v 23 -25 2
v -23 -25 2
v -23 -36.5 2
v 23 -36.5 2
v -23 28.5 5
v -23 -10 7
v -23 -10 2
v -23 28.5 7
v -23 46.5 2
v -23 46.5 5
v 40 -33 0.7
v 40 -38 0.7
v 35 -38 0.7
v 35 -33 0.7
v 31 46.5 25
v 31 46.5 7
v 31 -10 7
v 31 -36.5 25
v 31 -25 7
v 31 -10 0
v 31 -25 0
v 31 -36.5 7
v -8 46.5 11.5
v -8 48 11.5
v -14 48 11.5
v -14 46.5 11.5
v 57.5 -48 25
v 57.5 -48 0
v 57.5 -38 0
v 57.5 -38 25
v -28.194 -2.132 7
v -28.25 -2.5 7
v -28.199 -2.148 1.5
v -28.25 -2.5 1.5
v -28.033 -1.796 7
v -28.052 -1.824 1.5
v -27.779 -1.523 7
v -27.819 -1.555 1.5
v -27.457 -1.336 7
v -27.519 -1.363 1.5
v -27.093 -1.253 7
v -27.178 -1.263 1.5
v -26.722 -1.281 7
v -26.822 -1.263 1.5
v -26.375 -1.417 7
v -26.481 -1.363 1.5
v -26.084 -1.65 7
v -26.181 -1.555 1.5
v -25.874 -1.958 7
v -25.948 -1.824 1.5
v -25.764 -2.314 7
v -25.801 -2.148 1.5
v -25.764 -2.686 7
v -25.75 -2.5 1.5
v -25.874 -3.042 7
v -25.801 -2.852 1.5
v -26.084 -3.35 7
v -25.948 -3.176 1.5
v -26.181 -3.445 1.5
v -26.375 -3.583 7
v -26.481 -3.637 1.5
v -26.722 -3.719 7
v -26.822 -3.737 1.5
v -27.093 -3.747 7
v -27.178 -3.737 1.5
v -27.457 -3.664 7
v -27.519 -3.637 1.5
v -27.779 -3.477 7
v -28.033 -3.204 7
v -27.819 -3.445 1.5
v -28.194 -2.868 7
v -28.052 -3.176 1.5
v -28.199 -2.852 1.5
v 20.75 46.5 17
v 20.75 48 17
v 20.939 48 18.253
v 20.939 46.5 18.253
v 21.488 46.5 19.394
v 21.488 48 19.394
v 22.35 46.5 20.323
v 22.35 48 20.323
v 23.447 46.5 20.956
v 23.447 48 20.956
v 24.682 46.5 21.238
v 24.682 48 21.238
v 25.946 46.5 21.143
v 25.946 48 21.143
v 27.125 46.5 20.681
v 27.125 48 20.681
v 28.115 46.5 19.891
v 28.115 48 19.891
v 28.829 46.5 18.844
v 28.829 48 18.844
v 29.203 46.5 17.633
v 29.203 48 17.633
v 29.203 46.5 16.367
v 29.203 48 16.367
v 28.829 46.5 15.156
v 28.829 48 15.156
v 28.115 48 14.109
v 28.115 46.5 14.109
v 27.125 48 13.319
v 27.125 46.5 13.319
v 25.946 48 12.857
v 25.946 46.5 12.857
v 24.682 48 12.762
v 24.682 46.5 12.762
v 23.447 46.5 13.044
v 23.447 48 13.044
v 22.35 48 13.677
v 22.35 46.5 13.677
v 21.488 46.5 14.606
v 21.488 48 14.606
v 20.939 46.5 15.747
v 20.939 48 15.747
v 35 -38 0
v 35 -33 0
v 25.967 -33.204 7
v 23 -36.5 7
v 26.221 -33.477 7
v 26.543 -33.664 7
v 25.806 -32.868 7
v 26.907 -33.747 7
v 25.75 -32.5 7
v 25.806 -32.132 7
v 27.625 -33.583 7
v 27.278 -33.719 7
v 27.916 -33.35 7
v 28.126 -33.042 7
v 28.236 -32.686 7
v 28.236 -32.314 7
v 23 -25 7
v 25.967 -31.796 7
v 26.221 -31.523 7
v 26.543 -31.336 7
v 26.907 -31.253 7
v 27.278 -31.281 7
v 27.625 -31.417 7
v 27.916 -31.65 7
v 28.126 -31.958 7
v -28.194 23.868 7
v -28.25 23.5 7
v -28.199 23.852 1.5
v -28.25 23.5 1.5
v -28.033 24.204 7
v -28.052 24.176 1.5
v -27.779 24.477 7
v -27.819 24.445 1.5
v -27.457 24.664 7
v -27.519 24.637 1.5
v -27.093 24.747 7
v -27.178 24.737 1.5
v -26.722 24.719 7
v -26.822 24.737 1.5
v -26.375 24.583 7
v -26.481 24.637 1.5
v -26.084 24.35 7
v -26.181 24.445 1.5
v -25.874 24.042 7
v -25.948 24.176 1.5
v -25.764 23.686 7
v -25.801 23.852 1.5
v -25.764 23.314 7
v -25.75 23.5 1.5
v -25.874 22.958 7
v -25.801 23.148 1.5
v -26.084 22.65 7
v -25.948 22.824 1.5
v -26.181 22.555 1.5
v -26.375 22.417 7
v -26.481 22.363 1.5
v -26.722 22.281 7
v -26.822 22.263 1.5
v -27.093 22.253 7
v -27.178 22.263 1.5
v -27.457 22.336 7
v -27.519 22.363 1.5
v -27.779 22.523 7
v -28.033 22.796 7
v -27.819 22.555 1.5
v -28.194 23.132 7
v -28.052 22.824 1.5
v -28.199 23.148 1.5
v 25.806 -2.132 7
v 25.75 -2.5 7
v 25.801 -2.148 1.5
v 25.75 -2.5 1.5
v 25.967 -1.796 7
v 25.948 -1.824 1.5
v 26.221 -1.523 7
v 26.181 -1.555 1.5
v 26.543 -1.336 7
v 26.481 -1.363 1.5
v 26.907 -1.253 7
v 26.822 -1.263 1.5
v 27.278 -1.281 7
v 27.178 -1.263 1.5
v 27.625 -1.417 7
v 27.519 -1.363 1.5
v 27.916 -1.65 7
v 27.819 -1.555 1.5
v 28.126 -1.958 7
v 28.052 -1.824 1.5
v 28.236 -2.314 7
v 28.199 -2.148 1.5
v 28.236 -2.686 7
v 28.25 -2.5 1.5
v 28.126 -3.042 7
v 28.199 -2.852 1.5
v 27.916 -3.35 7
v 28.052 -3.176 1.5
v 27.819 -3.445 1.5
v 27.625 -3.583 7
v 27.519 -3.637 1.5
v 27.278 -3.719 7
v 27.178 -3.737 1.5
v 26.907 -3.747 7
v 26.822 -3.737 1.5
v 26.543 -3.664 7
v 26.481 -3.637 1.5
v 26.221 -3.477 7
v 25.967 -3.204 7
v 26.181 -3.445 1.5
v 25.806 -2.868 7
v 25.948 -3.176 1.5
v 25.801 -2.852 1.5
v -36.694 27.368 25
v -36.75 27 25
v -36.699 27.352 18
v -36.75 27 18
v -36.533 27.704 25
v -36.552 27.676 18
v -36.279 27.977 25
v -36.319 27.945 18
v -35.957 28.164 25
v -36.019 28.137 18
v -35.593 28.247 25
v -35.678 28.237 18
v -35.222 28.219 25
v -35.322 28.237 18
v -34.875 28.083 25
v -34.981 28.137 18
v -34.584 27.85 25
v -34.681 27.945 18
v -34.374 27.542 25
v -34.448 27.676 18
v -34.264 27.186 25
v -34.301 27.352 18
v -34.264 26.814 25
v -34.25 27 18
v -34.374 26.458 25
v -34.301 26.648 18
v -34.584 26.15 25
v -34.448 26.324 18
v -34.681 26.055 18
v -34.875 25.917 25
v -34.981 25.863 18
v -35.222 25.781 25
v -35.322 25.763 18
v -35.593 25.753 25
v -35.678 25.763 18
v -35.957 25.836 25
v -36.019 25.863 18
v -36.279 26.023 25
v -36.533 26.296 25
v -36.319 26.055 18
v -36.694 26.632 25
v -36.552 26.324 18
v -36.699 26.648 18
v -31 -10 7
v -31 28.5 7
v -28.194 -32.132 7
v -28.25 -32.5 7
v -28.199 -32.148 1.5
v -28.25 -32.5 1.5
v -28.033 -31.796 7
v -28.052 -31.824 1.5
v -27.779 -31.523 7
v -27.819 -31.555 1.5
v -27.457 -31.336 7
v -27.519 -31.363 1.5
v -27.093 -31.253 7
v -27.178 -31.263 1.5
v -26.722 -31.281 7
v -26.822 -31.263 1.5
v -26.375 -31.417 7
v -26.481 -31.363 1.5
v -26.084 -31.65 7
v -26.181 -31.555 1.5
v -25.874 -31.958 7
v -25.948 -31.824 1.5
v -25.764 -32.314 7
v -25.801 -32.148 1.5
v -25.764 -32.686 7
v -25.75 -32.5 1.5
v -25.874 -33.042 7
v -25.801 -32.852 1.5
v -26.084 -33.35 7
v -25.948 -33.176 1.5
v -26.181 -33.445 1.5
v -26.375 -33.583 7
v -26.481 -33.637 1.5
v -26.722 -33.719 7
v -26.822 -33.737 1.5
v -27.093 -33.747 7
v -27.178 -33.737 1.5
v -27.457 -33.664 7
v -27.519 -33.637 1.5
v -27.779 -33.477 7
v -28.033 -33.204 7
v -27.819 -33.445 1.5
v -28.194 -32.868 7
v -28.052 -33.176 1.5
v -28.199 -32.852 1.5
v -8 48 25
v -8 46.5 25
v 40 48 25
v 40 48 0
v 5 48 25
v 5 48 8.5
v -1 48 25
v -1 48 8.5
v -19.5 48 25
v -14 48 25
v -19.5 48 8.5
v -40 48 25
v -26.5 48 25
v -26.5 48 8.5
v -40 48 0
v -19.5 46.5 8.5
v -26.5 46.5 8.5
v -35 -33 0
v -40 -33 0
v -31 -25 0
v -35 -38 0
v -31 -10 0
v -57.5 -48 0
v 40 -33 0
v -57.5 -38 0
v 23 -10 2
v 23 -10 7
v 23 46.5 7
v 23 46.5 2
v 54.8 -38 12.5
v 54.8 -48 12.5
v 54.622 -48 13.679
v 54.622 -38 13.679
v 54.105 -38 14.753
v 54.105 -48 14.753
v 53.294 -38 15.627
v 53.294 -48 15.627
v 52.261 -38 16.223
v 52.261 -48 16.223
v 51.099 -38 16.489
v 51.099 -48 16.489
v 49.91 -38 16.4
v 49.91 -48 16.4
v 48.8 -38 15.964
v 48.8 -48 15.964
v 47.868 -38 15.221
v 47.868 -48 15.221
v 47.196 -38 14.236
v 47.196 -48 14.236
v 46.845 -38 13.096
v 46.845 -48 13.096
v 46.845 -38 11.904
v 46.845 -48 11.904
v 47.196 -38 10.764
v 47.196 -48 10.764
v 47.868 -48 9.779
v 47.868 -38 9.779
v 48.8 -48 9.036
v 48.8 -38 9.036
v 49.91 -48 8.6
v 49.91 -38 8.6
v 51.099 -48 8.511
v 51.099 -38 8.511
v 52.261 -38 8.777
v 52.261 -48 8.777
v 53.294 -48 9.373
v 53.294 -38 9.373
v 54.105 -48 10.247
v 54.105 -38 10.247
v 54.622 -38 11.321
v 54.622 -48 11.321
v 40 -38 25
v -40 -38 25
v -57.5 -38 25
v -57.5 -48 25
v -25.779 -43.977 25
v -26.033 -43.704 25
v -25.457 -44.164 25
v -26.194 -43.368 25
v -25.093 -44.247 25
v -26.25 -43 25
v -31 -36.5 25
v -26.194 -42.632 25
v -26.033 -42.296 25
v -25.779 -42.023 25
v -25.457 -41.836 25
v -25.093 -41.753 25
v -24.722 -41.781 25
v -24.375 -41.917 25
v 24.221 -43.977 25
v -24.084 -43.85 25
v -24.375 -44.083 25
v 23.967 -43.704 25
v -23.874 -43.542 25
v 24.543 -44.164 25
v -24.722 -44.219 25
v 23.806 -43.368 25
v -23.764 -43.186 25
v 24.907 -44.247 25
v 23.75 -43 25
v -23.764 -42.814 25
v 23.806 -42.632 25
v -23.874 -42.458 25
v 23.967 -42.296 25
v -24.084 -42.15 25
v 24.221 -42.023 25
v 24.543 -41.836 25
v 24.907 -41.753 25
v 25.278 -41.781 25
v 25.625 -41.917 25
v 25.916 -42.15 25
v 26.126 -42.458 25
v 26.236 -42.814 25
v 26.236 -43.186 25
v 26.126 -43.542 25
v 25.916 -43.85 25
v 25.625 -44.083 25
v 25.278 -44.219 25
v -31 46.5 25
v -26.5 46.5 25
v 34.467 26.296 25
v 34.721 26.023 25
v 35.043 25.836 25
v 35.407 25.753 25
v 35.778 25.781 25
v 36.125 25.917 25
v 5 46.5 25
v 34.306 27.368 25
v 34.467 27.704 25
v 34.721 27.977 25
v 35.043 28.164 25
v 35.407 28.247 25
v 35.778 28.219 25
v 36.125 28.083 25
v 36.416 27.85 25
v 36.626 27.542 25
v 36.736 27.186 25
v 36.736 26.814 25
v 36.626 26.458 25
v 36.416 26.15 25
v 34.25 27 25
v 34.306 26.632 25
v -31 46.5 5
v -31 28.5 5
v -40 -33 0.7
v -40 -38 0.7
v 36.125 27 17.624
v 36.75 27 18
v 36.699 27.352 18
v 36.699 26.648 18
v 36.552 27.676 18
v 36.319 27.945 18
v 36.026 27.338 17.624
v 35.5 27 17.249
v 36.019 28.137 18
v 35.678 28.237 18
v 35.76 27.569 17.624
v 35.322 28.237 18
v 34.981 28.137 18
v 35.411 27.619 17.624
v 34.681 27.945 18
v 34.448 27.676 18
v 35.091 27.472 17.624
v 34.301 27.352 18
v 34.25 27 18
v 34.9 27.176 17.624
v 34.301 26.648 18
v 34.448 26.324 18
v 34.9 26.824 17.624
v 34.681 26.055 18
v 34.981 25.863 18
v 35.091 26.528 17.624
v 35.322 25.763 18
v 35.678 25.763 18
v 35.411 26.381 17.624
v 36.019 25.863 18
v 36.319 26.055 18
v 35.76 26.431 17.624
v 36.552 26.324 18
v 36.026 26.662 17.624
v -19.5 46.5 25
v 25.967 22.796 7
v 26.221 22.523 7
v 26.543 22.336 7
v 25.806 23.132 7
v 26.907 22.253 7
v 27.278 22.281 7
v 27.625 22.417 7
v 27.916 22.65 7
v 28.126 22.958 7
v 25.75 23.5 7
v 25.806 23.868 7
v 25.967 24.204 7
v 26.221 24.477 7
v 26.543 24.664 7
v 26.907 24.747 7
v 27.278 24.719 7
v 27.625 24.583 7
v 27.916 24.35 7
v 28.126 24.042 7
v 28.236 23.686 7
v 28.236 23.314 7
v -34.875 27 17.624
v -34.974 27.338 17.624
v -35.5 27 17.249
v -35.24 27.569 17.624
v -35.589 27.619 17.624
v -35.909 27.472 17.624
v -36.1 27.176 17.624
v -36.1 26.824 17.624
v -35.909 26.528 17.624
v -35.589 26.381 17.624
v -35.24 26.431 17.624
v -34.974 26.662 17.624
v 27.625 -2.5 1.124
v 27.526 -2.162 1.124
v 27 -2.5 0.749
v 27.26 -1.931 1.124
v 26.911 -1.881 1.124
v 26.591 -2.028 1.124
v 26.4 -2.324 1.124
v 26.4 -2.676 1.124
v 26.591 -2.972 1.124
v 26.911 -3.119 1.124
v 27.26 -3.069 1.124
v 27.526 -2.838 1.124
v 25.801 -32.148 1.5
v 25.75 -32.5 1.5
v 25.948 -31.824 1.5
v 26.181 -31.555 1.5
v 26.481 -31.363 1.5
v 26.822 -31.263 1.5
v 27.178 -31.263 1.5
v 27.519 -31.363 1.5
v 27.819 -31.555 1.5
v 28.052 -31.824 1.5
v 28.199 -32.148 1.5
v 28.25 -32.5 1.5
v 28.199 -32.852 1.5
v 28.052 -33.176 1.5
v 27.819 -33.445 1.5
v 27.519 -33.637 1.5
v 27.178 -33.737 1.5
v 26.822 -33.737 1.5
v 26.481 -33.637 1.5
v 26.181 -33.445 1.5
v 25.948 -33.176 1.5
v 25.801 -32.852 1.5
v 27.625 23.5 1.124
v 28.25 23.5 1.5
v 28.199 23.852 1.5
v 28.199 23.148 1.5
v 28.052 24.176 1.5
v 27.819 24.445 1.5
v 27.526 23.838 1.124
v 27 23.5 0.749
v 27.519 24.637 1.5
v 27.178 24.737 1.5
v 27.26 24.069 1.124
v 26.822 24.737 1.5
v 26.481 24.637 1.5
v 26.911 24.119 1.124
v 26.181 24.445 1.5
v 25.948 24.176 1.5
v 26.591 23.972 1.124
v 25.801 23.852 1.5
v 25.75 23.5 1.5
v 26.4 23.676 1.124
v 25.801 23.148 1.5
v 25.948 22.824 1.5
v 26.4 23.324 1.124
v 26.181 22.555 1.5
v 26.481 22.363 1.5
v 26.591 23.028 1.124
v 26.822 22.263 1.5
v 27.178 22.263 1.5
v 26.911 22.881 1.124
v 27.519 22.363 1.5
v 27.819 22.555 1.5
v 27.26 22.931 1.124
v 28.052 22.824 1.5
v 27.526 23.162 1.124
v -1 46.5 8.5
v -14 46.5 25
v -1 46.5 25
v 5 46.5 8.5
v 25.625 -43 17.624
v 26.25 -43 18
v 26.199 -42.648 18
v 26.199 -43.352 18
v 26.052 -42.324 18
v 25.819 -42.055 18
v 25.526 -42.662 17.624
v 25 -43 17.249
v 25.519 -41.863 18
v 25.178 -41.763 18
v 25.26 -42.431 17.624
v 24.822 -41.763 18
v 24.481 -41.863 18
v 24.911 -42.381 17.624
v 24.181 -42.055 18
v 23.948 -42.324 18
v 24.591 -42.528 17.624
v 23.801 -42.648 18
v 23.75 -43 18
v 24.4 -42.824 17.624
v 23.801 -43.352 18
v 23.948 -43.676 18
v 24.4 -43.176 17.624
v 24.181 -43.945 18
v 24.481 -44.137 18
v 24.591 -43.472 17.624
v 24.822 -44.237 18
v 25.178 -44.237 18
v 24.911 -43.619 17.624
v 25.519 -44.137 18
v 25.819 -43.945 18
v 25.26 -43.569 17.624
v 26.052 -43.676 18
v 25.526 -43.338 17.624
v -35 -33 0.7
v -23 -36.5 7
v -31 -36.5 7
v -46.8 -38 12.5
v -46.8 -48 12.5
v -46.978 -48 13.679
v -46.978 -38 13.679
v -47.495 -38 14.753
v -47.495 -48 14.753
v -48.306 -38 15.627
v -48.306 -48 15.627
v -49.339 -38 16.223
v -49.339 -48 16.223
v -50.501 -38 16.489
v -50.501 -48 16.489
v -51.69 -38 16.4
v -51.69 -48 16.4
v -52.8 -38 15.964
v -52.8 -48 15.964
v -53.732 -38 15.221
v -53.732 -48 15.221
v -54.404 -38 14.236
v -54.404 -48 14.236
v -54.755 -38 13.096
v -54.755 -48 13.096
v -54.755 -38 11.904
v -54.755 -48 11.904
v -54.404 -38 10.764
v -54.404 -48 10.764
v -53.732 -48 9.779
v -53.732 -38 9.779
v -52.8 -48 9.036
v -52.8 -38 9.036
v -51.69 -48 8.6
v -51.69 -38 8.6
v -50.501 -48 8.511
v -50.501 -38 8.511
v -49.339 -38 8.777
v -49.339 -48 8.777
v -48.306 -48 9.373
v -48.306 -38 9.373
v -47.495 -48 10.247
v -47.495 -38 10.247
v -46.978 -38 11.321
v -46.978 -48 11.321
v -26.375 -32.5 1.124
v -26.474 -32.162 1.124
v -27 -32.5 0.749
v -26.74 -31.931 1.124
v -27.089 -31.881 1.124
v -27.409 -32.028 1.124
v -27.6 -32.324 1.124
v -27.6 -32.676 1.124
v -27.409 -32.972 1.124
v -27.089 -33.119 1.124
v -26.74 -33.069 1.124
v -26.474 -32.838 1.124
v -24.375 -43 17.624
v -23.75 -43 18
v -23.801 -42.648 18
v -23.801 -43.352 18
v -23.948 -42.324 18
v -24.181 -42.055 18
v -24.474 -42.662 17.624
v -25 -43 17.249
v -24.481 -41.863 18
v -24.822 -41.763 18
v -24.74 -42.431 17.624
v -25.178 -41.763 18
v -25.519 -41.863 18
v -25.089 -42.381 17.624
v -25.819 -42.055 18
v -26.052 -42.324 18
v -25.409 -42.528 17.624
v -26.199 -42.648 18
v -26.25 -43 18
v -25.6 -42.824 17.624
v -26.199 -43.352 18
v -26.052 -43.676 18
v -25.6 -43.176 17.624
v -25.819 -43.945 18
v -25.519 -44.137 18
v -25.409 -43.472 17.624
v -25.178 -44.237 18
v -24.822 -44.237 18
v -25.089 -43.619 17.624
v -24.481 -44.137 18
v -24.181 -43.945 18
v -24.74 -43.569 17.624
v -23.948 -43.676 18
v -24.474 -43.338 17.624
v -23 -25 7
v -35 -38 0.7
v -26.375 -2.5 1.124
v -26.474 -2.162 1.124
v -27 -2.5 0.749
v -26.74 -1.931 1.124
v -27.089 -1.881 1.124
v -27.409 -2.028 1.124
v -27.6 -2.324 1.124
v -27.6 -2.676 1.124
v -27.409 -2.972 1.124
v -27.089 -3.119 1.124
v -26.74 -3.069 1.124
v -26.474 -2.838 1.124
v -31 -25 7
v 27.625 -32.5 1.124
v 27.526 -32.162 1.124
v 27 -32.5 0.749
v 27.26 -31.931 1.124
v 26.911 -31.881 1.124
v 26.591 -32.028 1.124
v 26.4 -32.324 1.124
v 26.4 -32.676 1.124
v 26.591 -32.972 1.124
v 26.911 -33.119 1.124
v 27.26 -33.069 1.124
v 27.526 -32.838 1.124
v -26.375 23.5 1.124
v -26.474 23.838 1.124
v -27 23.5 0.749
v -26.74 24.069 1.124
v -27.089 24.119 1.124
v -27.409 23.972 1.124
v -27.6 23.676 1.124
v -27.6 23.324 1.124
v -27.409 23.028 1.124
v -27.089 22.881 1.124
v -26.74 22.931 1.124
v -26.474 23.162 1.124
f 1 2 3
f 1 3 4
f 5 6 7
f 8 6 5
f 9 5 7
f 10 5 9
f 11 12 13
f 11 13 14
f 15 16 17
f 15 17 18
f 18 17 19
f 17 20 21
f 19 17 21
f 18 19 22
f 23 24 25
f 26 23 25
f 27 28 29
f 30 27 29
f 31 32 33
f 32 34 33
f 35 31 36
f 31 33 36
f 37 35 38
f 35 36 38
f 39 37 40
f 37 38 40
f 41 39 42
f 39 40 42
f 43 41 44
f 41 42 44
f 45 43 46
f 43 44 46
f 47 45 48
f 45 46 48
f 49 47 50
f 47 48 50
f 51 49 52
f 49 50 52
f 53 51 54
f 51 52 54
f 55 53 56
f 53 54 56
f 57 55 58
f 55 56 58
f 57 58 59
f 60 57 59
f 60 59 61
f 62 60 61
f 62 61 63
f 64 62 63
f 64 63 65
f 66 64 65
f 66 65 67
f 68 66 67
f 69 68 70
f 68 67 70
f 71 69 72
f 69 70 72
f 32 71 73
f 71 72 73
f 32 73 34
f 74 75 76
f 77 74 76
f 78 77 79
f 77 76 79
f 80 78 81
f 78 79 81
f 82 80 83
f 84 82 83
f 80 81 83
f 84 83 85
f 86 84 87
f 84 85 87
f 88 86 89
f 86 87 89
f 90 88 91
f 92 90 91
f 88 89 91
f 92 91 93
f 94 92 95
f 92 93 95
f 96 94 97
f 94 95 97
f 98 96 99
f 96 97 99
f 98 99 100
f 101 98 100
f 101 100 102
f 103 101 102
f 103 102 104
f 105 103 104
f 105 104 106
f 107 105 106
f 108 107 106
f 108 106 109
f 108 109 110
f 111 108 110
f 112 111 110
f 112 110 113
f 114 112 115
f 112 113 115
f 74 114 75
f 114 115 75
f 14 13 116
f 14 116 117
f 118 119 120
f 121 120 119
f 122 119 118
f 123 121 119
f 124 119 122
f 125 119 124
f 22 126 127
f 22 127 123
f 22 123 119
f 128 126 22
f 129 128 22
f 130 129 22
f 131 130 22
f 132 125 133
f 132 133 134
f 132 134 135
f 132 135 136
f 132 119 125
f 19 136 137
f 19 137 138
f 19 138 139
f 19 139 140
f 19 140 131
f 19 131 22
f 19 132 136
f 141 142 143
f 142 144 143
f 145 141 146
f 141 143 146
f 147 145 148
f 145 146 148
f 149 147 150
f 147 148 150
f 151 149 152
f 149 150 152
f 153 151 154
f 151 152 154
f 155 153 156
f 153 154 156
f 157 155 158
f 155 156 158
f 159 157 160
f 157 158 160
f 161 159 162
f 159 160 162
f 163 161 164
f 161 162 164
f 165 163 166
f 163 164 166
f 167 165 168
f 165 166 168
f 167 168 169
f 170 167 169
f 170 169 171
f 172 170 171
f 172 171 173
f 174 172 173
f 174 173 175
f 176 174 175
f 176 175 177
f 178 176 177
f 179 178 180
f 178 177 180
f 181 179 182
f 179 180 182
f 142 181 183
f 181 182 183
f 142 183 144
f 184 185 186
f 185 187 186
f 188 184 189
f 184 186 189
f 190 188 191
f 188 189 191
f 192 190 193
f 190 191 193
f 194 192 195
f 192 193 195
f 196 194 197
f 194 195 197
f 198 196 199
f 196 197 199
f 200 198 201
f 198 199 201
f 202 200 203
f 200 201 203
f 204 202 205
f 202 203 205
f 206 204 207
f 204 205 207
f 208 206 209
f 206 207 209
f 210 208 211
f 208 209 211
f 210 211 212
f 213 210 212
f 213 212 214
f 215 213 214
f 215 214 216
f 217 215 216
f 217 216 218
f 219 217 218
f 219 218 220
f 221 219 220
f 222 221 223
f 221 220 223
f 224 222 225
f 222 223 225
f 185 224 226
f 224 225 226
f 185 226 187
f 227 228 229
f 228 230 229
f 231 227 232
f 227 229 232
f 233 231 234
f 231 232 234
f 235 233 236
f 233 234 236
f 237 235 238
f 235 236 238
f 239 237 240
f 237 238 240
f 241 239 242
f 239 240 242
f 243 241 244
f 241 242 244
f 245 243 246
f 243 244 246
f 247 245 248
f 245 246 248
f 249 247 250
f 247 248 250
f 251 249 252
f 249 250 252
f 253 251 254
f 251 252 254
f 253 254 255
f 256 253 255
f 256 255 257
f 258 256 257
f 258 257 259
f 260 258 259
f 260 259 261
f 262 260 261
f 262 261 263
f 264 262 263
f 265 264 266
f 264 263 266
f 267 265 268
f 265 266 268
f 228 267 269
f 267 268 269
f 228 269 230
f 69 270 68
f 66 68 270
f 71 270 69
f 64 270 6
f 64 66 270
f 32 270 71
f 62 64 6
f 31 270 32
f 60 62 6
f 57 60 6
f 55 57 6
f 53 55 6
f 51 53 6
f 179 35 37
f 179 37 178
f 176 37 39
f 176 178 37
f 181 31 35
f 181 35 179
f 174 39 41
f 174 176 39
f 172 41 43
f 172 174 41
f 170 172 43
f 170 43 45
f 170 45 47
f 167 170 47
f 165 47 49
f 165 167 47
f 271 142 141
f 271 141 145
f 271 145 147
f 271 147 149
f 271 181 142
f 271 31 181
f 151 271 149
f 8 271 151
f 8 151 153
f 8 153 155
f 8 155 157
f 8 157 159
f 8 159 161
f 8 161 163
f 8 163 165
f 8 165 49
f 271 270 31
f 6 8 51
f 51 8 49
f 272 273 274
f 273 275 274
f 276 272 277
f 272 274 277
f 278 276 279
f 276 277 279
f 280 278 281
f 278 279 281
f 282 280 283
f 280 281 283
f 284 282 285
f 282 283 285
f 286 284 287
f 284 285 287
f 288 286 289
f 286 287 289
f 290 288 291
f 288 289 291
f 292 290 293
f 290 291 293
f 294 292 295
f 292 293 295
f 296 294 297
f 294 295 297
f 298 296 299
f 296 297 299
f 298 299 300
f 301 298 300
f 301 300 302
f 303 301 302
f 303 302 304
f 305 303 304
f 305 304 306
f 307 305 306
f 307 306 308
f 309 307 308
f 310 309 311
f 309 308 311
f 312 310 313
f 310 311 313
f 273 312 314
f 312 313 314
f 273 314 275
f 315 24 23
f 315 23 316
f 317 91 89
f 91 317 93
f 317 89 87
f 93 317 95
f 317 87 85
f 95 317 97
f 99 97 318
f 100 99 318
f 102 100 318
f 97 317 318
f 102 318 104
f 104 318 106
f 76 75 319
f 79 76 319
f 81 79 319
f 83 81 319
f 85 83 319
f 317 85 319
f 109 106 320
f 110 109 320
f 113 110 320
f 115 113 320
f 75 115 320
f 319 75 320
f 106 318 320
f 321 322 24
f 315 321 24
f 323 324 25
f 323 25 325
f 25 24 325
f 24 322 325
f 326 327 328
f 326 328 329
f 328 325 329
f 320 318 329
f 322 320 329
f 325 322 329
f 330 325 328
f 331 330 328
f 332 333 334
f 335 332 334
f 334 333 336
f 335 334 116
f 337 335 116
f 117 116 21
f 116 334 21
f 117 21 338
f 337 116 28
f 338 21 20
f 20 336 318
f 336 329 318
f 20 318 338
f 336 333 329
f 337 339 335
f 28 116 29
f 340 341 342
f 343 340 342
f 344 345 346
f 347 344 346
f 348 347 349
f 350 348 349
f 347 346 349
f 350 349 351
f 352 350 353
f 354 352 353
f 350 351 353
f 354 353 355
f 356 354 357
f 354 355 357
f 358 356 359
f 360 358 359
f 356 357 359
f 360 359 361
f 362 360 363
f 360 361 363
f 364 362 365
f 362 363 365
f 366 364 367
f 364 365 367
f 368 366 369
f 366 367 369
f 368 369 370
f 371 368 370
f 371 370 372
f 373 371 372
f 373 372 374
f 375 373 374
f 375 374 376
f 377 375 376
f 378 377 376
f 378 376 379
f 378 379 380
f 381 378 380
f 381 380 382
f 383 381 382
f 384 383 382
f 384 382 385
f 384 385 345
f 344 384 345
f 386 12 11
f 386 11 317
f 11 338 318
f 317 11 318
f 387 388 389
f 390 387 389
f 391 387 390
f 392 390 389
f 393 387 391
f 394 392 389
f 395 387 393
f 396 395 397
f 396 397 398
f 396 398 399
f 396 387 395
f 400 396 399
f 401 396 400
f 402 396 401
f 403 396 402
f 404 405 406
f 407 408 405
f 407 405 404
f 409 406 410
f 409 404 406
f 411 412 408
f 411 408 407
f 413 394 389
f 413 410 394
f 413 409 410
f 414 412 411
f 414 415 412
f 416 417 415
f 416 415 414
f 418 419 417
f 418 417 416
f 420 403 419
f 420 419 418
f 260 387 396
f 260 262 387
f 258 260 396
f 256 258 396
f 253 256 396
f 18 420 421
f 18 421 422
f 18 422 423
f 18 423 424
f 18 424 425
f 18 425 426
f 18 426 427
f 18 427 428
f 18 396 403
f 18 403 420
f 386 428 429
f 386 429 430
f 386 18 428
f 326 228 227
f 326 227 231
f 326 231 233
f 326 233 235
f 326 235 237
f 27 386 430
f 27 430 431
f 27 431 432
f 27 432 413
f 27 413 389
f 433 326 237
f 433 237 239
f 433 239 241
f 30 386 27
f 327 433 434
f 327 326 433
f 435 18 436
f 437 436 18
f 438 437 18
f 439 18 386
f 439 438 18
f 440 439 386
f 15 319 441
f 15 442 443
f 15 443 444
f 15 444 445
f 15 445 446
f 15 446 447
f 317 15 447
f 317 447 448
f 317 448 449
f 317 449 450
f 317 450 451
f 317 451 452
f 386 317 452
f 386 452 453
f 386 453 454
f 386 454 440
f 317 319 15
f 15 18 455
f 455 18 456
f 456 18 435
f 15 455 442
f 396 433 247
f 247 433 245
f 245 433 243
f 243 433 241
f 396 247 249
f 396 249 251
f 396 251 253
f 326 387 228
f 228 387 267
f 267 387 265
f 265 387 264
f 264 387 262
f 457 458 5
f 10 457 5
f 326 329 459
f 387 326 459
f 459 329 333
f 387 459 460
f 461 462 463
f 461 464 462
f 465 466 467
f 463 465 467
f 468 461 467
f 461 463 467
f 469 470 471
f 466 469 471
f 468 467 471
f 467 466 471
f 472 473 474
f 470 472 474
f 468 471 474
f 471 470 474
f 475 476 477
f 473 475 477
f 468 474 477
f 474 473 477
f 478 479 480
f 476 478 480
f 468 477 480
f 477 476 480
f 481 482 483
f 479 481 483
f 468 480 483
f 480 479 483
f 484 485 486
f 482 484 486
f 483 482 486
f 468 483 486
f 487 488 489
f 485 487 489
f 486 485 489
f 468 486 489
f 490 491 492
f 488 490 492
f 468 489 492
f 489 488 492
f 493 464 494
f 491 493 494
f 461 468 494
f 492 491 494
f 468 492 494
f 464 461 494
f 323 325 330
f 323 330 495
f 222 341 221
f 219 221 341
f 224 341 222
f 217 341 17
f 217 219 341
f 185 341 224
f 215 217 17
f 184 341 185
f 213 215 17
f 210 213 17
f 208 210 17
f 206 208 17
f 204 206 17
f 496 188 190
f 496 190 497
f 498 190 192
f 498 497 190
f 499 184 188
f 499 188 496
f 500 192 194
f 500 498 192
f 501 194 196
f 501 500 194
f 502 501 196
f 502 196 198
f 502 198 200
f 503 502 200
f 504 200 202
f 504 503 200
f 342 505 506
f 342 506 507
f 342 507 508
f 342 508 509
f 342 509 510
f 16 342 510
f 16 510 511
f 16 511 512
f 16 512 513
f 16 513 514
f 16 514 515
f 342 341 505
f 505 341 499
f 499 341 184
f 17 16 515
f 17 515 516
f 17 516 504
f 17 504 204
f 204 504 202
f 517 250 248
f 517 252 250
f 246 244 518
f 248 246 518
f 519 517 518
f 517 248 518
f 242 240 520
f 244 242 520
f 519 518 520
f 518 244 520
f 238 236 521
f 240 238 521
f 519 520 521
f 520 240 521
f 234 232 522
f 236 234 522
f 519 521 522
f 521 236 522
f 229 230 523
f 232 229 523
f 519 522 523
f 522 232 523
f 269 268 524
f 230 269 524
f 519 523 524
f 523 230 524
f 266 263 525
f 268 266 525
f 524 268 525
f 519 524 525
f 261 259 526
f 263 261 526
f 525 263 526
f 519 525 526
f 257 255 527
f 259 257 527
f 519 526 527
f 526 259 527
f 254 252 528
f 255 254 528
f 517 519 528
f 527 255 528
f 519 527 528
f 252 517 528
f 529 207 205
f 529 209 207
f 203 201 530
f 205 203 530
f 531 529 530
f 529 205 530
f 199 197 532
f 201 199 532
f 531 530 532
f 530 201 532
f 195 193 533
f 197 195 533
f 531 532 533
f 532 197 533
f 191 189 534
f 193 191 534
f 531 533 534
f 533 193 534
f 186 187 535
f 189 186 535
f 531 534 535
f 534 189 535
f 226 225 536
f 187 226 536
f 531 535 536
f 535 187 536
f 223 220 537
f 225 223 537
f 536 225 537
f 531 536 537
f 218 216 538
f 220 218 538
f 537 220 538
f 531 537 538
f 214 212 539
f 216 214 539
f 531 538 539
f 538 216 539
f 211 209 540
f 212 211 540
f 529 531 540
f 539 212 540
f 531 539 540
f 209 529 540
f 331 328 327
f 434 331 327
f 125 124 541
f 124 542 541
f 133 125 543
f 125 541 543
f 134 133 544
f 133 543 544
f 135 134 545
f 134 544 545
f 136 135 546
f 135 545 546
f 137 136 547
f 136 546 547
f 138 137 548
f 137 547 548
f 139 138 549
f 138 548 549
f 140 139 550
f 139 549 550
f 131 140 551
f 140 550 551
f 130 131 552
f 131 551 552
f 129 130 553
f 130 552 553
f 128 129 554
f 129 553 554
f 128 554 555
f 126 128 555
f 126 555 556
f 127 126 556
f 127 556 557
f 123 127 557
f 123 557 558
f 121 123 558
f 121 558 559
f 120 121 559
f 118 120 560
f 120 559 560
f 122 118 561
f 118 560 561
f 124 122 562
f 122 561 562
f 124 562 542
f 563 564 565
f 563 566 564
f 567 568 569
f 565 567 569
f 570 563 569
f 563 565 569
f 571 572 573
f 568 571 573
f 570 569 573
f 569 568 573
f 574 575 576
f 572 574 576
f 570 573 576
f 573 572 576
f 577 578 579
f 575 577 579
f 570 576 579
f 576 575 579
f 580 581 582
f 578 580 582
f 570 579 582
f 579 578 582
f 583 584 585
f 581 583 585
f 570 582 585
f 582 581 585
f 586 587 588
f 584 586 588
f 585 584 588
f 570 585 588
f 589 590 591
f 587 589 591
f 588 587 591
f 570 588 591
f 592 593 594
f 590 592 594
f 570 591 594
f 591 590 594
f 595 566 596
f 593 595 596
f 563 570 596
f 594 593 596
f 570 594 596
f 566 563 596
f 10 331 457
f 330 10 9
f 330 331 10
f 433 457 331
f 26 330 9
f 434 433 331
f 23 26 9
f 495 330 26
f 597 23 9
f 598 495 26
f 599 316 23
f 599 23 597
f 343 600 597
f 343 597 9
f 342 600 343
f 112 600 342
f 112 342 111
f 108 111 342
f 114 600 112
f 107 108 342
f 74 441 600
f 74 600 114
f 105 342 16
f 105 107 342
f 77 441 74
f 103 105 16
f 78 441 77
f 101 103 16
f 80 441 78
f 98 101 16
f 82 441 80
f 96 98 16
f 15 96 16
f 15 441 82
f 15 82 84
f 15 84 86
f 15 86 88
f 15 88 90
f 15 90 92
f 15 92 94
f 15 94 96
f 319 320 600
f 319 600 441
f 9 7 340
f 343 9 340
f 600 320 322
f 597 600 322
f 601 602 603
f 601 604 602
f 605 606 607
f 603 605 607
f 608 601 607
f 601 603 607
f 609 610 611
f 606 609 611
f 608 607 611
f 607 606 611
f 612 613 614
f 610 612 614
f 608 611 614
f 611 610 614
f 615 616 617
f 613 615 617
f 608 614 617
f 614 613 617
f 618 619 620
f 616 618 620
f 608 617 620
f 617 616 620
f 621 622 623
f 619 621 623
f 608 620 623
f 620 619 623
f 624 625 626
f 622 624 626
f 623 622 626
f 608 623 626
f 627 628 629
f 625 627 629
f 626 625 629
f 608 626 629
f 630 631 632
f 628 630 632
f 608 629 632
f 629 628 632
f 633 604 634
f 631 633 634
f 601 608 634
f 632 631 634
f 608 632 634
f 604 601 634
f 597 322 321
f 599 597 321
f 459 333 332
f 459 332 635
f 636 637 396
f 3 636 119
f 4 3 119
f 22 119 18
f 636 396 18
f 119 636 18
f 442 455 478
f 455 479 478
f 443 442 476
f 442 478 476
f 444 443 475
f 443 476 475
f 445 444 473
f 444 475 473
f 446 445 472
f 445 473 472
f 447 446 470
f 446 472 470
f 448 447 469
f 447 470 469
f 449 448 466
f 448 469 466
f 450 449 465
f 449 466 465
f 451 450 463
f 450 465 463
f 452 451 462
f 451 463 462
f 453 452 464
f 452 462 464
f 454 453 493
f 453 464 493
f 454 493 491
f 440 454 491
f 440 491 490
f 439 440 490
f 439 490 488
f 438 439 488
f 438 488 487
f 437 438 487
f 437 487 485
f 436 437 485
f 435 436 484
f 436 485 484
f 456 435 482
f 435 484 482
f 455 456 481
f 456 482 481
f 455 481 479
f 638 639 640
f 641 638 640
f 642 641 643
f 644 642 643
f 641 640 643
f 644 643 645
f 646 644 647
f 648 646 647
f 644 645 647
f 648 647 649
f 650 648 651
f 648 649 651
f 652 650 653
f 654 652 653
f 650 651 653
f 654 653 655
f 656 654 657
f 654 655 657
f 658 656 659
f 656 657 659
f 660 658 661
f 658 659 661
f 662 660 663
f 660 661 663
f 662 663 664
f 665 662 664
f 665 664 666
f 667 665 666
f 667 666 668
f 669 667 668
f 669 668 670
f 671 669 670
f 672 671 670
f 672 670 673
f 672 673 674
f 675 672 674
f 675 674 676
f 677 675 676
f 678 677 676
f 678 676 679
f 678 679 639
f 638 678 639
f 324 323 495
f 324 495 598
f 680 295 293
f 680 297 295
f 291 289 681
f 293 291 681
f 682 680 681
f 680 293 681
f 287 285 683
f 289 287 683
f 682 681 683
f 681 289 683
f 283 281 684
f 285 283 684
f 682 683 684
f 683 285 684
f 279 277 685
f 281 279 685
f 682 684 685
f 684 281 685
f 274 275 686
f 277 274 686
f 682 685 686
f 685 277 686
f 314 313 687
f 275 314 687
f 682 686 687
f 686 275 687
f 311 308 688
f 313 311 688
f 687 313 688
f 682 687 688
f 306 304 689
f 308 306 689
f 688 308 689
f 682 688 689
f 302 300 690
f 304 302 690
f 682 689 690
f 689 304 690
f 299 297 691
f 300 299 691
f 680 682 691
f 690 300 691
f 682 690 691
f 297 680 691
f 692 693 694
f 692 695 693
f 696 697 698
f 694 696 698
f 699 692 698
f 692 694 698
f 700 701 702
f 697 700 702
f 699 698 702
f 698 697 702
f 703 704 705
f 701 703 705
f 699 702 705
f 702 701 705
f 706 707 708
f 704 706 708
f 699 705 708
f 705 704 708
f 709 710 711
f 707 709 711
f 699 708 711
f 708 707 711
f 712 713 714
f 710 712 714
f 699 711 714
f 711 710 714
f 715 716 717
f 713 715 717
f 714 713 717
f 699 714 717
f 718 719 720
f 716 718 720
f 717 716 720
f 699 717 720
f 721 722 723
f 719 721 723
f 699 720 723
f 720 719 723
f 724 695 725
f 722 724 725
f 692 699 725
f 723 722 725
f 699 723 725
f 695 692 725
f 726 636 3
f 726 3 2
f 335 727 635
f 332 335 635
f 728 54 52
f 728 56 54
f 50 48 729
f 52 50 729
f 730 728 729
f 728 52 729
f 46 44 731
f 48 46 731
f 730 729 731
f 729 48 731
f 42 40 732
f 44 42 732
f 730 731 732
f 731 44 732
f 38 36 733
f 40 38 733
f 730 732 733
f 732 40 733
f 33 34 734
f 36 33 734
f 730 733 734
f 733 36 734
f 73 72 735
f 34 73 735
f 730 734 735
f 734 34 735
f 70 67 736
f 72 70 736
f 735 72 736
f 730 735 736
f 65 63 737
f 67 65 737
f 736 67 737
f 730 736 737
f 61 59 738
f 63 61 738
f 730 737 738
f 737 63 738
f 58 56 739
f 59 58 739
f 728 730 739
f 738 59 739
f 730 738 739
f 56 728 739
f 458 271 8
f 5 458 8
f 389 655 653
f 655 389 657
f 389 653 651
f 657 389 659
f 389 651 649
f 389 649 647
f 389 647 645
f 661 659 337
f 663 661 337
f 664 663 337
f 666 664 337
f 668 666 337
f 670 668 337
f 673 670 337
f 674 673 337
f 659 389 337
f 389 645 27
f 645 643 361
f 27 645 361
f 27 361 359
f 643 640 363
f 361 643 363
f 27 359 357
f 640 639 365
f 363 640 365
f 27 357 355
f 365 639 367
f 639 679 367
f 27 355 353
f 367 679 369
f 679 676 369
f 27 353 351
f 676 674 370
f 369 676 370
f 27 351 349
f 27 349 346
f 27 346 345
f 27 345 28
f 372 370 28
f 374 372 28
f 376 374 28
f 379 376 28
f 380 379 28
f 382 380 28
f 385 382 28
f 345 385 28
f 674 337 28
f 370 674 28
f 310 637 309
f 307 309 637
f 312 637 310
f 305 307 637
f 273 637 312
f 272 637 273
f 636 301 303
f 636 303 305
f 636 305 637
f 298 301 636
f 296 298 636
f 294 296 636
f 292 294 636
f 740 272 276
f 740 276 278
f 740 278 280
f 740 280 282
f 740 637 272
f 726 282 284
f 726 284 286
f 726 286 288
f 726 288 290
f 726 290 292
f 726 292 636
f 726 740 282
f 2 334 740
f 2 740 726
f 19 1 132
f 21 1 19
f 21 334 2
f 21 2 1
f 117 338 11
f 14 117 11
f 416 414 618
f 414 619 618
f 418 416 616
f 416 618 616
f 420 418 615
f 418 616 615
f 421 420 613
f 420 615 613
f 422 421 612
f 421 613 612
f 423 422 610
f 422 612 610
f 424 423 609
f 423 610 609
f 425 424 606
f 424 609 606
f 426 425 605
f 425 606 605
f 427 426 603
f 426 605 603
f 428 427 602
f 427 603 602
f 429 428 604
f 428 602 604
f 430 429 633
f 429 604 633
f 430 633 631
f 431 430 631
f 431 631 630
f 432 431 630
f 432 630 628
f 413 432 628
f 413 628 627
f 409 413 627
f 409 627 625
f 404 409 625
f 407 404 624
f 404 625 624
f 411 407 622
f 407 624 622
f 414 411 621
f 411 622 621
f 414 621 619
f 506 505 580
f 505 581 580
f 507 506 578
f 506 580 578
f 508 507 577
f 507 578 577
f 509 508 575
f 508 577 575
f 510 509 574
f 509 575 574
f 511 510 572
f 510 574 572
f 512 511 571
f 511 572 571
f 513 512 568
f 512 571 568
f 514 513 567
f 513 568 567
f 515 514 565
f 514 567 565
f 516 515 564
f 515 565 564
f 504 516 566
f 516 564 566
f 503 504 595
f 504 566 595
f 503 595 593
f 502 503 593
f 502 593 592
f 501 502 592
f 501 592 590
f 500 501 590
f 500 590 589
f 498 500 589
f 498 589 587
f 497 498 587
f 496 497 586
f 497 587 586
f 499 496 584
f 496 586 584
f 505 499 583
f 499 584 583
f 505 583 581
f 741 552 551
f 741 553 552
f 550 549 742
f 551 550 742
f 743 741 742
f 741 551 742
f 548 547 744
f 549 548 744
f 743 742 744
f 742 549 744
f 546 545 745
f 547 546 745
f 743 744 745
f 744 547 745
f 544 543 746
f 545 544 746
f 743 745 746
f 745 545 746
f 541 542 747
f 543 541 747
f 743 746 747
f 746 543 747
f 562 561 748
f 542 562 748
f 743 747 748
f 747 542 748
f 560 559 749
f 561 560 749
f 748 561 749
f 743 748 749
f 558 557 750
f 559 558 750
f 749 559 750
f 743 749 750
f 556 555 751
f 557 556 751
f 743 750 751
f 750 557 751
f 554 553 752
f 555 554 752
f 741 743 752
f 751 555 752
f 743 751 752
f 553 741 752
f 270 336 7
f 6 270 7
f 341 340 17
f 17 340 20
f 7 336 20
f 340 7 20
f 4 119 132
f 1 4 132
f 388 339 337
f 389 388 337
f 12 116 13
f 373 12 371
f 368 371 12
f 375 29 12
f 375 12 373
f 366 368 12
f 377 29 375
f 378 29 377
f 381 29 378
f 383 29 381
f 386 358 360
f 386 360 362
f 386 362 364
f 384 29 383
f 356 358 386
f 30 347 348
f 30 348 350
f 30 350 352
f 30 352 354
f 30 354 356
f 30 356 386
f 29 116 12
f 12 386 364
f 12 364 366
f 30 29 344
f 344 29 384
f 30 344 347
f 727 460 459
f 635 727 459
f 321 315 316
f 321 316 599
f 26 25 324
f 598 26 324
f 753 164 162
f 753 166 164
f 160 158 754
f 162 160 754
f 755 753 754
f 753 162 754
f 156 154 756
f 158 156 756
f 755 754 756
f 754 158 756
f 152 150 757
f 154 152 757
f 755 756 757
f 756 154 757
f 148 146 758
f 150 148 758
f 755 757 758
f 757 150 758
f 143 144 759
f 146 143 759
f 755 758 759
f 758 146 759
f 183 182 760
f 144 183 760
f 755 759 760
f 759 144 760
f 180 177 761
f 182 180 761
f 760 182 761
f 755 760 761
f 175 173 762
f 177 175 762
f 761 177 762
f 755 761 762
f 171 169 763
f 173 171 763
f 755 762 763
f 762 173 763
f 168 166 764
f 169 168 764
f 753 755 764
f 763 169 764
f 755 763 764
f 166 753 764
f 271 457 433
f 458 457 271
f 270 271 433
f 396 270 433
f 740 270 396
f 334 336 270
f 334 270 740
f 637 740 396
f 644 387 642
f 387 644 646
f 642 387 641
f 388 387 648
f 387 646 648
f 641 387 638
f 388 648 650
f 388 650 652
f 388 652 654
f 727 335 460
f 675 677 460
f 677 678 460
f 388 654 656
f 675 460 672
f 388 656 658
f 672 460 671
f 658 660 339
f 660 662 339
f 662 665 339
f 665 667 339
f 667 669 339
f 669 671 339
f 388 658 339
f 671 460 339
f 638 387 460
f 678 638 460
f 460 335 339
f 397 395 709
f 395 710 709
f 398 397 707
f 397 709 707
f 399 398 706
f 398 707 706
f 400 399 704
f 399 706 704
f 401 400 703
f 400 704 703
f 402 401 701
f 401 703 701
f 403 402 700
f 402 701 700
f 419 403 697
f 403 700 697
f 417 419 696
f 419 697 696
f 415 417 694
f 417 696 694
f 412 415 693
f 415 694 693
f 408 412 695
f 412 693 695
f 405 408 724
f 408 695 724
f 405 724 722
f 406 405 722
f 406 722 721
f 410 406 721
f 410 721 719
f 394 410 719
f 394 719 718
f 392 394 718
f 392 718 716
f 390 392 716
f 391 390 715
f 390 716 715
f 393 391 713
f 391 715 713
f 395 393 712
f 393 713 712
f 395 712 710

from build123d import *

# Parameters (mm, degrees)
F1_DEPTH  = 25
F2_W      = 62
F2_H      = 83
F3_DEPTH  = 18
F4_W      = 46
F4_H      = 83
F5_DEPTH  = 5
F7_D      = 2.5
F7_DEPTH  = 5.5
F7_TIP    = 0.7510757738
F8_W      = 62
F8_H      = 15
F9_DEPTH  = 25.001
F11_D     = 8
F12_W     = 6
F12_H     = 16.5
F12_H_2   = 13.5
F12_W_2   = 7
F13_DEPTH = 1.5
F14_W     = 8
F14_H     = 18
F15_DEPTH = 2
F16_R     = 4.25
F17_DEPTH = 1.5
F18_W     = 5
F18_H     = 0.7
F19_DEPTH = 5
F21_D     = 2.5
F21_DEPTH = 7
F21_TIP   = 0.7510757738


# Not quite as in the source:
# - a pattern or mirror of a feature is missing from the dataset's text; its kind, count and spacing are read off the source's solid


with BuildPart() as f1:
    # F0 (on Top) → F1 (new body)
    with BuildSketch(Plane.XY):
        Polygon((40, 48), (-40, 48), (-40, -38), (-57.5, -38), (-57.5, -48), (57.5, -48), (57.5, -38), (40, -38), align=None)
    extrude(amount=F1_DEPTH)

    # F2 (on face) → F3 (cut)
    with BuildSketch(Plane.XY.offset(25)):
        with Locations((0, 5)):
            Rectangle(F2_W, F2_H)
    extrude(amount=-F3_DEPTH, mode=Mode.SUBTRACT)

    # F4 (on face) → F5 (cut)
    with BuildSketch(Plane.XY.offset(7)):
        with Locations((0, 5)):
            Rectangle(F4_W, F4_H)
    extrude(amount=-F5_DEPTH, mode=Mode.SUBTRACT)

    # F7
    with Locations(Plane.XY.offset(7)):
        with Locations((-27, -32.5), (-27, -2.5), (-27, 23.5), (27, -32.5), (27, -2.5), (27, 23.5)):
            Hole(F7_D / 2, depth=F7_DEPTH)
            with Locations((0, 0, -(F7_DEPTH + F7_TIP / 2))):  # 118° drill point
                Cone(0, F7_D / 2, F7_TIP, mode=Mode.SUBTRACT)

    # F8 (on face) → F9 (cut, through all)
    with BuildSketch(Plane(origin=(0, 0, 0), x_dir=(1, 0, 0), z_dir=(0, 0, -1))):
        with Locations((0, 17.5)):
            Rectangle(F8_W, F8_H)
    extrude(amount=-F9_DEPTH, mode=Mode.SUBTRACT)

    # F11 (through all)
    with Locations(Plane(origin=(0, -38, 0), x_dir=(-1, 0, 0), z_dir=(0, 1, 0))):
        with Locations((50.8, 12.5), (-50.8, 12.5)):
            Hole(F11_D / 2)

    # F12 (on face) → F13 (cut, through all)
    with BuildSketch(Plane(origin=(0, 48, 0), x_dir=(-1, 0, 0), z_dir=(0, 1, 0))):
        with Locations((-2, 16.75)):
            Rectangle(F12_W, F12_H)
        with Locations((11, 18.25)):
            Rectangle(F12_W, F12_H_2)
        with Locations((23, 16.75)):
            Rectangle(F12_W_2, F12_H)
    extrude(amount=-F13_DEPTH, mode=Mode.SUBTRACT)

    # F14 (on face) → F15 (cut)
    with BuildSketch(Plane.XY.offset(7)):
        with Locations((-27, 37.5)):
            Rectangle(F14_W, F14_H)
    extrude(amount=-F15_DEPTH, mode=Mode.SUBTRACT)

    # F16 (on face) → F17 (cut, through all)
    with BuildSketch(Plane(origin=(0, 48, 0), x_dir=(-1, 0, 0), z_dir=(0, 1, 0))):
        with Locations((-25, 17)):
            Circle(F16_R)
    extrude(amount=-F17_DEPTH, mode=Mode.SUBTRACT)

    # F18 (on face) → F19 (cut)
    with BuildSketch(Plane.YZ.offset(40)):
        with Locations((-35.5, 0.35)):
            Rectangle(F18_W, F18_H)
    f19 = extrude(amount=-F19_DEPTH, mode=Mode.SUBTRACT)

    # F19_copies: F19 across plane
    add(f19.mirror(Plane(origin=(0, 0, 0), x_dir=(0, 0, -1), z_dir=(-1, 0, 0))), mode=Mode.SUBTRACT)

    # F21
    with Locations(Plane.XY.offset(25)):
        with Locations((25, -43), (-25, -43), (35.5, 27), (-35.5, 27)):
            Hole(F21_D / 2, depth=F21_DEPTH)
            with Locations((0, 0, -(F21_DEPTH + F21_TIP / 2))):  # 118° drill point
                Cone(0, F21_D / 2, F21_TIP, mode=Mode.SUBTRACT)


solid = f1.part
